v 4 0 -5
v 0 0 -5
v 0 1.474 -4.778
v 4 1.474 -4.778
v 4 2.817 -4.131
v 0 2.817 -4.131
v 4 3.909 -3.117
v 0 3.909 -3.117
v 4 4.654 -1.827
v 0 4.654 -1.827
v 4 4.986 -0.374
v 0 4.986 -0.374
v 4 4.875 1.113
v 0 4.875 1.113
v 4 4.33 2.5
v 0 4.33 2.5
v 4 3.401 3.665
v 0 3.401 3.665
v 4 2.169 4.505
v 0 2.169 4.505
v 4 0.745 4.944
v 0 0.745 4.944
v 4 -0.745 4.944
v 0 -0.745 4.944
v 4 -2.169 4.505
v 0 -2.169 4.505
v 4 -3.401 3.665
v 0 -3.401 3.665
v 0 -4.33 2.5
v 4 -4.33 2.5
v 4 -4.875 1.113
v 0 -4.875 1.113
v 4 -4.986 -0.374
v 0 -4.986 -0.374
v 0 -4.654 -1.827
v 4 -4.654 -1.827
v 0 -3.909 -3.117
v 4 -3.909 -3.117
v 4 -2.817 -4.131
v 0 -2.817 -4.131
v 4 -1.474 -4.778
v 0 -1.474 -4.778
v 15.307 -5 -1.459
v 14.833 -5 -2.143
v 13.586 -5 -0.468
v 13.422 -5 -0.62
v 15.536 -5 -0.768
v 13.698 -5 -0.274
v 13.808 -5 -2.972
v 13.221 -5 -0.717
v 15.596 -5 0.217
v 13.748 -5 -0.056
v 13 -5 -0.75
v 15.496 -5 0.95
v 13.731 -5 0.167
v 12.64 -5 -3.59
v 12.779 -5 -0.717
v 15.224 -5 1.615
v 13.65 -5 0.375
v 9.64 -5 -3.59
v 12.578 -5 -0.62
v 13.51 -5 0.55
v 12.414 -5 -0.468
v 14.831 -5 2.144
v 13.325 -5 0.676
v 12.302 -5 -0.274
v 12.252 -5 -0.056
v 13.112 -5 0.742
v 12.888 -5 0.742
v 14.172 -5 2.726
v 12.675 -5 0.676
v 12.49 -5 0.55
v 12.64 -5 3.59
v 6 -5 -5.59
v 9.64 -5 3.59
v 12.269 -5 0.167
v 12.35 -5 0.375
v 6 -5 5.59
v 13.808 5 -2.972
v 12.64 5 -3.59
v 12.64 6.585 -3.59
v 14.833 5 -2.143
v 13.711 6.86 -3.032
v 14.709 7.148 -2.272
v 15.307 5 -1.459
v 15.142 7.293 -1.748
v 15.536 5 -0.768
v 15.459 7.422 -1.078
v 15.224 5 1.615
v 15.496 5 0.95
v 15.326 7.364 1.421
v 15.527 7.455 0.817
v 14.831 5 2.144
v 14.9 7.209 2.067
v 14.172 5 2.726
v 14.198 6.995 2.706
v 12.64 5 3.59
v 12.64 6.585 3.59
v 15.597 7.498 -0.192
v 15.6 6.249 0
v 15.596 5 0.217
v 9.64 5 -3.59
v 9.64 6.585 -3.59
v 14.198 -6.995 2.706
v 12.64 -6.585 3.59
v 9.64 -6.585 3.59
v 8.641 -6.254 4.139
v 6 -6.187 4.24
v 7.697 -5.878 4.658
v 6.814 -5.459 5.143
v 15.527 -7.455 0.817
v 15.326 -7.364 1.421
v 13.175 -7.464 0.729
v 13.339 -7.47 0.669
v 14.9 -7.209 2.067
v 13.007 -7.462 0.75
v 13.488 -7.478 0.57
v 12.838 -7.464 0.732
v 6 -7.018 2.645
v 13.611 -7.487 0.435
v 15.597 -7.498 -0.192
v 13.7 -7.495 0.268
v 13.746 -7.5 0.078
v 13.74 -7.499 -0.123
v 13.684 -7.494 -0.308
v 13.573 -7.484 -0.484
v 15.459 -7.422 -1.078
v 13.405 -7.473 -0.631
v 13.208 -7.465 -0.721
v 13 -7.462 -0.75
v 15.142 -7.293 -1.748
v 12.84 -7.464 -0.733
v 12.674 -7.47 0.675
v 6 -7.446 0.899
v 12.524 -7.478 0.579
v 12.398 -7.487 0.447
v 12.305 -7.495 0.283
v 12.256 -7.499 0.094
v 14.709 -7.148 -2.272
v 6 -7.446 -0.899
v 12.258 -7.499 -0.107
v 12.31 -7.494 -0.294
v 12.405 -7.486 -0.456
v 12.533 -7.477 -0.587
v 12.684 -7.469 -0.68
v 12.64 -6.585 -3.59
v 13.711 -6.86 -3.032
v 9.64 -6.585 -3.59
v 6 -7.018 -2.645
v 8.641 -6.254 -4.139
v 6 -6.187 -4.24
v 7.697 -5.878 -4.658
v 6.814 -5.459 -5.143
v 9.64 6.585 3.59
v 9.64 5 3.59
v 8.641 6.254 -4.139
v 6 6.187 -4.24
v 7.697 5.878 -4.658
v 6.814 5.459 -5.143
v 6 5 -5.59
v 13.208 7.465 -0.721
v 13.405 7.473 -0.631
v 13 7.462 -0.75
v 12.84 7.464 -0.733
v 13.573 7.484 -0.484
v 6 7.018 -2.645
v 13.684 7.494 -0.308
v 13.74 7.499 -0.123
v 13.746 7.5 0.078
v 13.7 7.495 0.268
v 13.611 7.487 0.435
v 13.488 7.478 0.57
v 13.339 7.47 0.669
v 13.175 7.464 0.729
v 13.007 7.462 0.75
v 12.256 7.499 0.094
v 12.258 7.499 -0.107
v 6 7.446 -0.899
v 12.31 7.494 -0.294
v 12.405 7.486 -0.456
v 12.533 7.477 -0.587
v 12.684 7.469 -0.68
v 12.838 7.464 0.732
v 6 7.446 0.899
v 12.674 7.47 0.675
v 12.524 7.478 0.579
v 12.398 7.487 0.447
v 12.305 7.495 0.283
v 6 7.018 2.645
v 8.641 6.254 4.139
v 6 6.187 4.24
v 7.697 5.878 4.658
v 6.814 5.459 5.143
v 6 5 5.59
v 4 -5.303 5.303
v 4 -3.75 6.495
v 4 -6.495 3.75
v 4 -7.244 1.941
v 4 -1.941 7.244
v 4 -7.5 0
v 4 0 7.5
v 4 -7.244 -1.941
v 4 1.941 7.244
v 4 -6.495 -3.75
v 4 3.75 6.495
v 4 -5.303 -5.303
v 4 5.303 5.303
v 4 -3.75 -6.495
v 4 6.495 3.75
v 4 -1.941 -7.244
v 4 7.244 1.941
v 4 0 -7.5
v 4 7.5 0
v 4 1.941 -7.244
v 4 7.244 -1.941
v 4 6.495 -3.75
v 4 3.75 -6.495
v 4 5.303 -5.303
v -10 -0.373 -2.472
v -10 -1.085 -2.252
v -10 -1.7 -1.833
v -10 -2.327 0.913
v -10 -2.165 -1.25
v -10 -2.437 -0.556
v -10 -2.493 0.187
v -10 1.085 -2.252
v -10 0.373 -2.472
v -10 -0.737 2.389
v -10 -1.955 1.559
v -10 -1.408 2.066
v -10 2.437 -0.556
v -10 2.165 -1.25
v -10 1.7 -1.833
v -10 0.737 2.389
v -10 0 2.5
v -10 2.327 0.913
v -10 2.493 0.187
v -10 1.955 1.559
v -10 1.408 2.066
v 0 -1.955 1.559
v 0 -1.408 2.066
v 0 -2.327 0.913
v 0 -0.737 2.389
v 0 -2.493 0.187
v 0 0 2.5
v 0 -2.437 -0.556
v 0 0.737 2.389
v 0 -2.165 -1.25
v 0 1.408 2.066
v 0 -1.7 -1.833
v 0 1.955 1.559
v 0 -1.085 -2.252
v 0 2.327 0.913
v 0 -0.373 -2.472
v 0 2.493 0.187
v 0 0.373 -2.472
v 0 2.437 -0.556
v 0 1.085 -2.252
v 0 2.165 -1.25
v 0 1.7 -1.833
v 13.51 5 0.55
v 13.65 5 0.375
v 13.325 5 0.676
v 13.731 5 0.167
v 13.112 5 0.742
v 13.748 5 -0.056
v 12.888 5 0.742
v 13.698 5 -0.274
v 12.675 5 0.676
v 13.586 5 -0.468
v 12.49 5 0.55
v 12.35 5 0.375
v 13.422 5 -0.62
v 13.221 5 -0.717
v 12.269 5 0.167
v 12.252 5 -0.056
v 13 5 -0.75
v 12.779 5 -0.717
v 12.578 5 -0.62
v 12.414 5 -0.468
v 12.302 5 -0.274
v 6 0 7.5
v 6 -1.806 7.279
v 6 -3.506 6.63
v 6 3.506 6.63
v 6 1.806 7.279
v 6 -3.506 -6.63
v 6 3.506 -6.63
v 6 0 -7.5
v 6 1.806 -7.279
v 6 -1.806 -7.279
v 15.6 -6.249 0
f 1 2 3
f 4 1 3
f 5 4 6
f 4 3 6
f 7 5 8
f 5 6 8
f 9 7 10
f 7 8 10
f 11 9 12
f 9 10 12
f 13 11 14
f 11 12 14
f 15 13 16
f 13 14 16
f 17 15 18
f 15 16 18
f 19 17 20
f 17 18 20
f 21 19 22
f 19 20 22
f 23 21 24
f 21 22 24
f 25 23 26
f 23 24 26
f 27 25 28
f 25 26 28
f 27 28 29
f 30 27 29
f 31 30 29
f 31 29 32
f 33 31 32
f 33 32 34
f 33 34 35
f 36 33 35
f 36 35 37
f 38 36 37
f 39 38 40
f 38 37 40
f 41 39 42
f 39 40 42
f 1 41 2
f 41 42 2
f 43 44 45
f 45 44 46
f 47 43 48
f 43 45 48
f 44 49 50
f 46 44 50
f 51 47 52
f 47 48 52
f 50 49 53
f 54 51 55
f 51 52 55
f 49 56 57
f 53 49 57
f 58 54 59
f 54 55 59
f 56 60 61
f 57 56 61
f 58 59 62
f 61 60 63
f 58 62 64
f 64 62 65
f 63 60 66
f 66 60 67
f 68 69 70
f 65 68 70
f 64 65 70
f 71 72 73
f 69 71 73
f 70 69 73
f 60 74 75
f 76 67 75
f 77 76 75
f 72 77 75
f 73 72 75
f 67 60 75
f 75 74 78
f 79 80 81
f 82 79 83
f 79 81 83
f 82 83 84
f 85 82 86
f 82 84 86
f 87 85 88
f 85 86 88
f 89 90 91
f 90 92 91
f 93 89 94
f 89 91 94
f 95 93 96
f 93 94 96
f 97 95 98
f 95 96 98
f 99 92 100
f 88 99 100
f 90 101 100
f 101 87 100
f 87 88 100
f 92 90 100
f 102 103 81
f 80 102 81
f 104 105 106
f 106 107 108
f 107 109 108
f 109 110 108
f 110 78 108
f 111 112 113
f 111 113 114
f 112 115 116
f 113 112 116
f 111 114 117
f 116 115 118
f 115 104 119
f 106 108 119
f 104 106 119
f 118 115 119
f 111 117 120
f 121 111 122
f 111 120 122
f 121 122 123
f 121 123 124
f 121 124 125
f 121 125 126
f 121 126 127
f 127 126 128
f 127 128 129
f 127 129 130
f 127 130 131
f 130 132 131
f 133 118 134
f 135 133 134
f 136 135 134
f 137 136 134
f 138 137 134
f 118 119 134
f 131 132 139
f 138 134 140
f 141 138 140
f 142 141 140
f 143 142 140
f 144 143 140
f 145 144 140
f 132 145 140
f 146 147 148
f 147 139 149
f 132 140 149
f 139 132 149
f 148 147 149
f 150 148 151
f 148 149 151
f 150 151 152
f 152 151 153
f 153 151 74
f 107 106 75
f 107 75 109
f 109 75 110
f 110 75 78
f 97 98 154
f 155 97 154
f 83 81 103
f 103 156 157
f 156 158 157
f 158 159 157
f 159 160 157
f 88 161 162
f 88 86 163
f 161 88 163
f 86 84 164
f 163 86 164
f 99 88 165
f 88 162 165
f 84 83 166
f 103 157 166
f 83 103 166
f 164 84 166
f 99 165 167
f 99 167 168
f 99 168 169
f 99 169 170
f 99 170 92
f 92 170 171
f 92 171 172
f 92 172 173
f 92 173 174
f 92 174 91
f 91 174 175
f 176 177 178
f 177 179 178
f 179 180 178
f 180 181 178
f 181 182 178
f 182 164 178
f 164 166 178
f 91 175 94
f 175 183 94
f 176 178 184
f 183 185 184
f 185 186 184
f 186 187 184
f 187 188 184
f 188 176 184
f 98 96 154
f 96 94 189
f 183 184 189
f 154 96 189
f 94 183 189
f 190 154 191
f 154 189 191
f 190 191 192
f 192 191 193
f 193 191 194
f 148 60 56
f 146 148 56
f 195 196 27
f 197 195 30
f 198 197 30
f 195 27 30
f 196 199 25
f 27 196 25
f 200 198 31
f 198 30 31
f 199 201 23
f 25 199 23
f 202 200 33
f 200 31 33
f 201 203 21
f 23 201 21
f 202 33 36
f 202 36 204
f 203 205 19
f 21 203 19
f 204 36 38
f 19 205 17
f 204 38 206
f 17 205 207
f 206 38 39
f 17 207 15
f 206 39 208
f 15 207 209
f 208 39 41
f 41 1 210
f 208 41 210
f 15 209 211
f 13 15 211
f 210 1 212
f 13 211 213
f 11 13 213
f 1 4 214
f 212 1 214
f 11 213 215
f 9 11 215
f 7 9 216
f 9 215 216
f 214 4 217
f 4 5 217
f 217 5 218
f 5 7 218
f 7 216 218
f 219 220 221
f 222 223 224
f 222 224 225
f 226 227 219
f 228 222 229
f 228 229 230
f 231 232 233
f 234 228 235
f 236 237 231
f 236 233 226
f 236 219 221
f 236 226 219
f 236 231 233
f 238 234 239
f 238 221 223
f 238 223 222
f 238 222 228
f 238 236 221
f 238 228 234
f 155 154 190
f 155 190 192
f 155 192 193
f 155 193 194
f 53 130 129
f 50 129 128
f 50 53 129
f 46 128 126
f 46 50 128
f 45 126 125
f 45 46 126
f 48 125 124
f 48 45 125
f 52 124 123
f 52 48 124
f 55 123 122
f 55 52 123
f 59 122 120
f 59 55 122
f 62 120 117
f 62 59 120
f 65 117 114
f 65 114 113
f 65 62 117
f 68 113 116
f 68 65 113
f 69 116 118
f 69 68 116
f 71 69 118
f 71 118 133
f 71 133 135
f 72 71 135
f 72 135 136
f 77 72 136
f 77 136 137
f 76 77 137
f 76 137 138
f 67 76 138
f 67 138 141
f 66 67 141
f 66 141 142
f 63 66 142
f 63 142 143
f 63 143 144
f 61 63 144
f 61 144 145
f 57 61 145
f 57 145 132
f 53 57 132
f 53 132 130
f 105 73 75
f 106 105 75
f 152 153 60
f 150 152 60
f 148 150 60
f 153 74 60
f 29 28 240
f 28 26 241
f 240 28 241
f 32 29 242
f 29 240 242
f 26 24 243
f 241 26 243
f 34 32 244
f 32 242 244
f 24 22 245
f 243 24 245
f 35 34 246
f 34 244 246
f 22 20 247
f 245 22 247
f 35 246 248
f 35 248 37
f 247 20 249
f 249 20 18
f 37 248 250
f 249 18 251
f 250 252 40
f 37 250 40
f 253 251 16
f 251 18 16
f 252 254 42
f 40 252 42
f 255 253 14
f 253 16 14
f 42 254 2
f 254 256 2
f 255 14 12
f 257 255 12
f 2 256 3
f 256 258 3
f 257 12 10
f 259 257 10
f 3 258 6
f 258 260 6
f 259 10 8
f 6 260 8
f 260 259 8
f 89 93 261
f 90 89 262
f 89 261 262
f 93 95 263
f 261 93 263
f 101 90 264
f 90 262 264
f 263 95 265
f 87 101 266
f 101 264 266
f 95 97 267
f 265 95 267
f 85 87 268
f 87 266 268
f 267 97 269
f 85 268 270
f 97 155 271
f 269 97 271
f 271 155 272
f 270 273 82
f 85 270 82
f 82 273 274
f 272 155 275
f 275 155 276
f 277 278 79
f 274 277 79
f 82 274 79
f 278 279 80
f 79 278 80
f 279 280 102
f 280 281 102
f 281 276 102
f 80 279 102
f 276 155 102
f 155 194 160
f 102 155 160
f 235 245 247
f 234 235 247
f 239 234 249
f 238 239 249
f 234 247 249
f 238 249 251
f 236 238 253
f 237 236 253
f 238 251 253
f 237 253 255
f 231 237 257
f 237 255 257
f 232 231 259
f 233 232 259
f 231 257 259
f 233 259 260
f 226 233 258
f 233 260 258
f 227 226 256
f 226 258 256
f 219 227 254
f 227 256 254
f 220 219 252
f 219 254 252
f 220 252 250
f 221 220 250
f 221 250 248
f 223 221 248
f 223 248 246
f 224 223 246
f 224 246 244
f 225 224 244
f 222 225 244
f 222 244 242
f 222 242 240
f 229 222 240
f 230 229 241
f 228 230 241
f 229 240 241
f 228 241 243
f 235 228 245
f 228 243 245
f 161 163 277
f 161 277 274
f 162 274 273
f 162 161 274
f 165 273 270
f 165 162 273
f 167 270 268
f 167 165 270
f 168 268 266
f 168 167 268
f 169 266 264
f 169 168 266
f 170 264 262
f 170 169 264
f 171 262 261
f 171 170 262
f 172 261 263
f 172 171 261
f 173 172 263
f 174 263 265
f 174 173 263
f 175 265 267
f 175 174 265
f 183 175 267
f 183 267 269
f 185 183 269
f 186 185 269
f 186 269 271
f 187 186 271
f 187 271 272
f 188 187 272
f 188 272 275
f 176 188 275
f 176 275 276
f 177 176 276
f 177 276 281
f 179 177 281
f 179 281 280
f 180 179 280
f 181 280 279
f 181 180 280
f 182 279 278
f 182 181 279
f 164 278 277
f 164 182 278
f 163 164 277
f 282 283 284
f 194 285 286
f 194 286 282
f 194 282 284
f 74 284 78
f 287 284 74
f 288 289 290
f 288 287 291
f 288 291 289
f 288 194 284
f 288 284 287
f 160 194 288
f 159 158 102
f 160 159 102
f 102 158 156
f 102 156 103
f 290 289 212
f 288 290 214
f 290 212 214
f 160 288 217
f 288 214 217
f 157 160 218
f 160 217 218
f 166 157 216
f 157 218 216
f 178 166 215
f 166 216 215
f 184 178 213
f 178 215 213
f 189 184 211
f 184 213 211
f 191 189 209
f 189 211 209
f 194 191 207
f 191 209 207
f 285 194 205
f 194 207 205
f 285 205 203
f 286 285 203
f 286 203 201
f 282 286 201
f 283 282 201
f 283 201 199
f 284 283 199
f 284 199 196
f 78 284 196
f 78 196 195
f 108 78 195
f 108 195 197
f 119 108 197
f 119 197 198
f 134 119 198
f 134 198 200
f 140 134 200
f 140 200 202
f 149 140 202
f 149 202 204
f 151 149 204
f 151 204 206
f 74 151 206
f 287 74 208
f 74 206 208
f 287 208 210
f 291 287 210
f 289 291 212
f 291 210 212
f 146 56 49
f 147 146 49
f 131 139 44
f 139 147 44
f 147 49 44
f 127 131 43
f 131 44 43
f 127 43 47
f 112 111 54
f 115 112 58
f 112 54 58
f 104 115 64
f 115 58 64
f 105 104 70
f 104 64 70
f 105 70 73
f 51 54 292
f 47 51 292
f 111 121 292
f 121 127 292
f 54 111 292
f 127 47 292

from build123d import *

# Parameters (mm, degrees)
SKETCH1_R               = 5
BOSS_EXTRUDE1_DEPTH     = 4
SKETCH2_R               = 7.5
BOSS_EXTRUDE2_DEPTH     = 2
BOSS_EXTRUDE3_DEPTH     = 10
CUT_EXTRUDE1_DEPTH      = 22.644860822
CUT_EXTRUDE1_DEPTH_BACK = 22.644860822
CUT_EXTRUDE2_DEPTH      = 22.350878369
CUT_EXTRUDE2_DEPTH_BACK = 22.350878369
SKETCH5_R               = 0.75
SKETCH6_R               = 2.5
BOSS_EXTRUDE4_DEPTH     = 10


with BuildPart() as part:
    # Sketch1 → Boss-Extrude1 (new body)
    with BuildSketch(Plane(origin=(0, 0, 0), x_dir=(0, 0, -1), z_dir=(1, 0, 0))):
        Circle(SKETCH1_R)
    extrude(amount=BOSS_EXTRUDE1_DEPTH)

    # Sketch2 → Boss-Extrude2 (add)
    with BuildSketch(Plane(origin=(4, 0, 0), x_dir=(0, 0, -1), z_dir=(1, 0, 0))):
        Circle(SKETCH2_R)
    extrude(amount=BOSS_EXTRUDE2_DEPTH)

    # Sketch3 → Boss-Extrude3 (add)
    with BuildSketch(Plane(origin=(6, 0, 0), x_dir=(0, 0, -1), z_dir=(1, 0, 0))):
        with BuildLine():
            ThreePointArc((5.590169944, 5), (0, 7.5), (-5.590169944, 5))
            Line((-5.590169944, 5), (-4.898979486, 5))
            Line((-4.898979486, 5), (4.898979486, 5))
            Line((4.898979486, 5), (5.590169944, 5))
        make_face()
        with BuildLine():
            Line((-4.898979486, -5), (-5.590169944, -5))
            ThreePointArc((-5.590169944, -5), (0, -7.5), (5.590169944, -5))
            Line((5.590169944, -5), (4.898979486, -5))
            Line((4.898979486, -5), (-4.898979486, -5))
        make_face()
    extrude(amount=BOSS_EXTRUDE3_DEPTH)

    # Sketch4 → Cut-Extrude1 (cut, two sides: drawn at the far end of the back side and taken through both)
    with BuildSketch(Plane.XZ.offset(-5).offset(-CUT_EXTRUDE1_DEPTH_BACK)):
        with BuildLine():
            Line((6, 5.590169944), (16, 5.590169944))
            Line((16, 5.590169944), (16, -5.590169944))
            Line((16, -5.590169944), (6, -5.590169944))
            Line((6, -5.590169944), (9.640400827, -3.590169944))
            Line((9.640400827, -3.590169944), (12.640400827, -3.590169944))
            add(Edge.make_bspline(
                [(12.640400827, -3.590169944), (15.280133609, -2.393446629), (15.919866391, 0), (15.280133609, 2.393446629), (12.640400827, 3.590169944)],
                knots=[0.178885438, 0.178885438, 0.178885438, 0.178885438, 0.5, 0.821114562, 0.821114562, 0.821114562, 0.821114562], degree=3))
            Line((12.640400827, 3.590169944), (9.640400827, 3.590169944))
            Line((9.640400827, 3.590169944), (6, 5.590169944))
        make_face()
    extrude(amount=CUT_EXTRUDE1_DEPTH + CUT_EXTRUDE1_DEPTH_BACK, mode=Mode.SUBTRACT)

    # Sketch5 → Cut-Extrude2 (cut, two sides: drawn at the far end of the back side and taken through both)
    with BuildSketch(Plane.XZ.offset(-5).offset(-CUT_EXTRUDE2_DEPTH_BACK)):
        with Locations(Location((13, 0, 0), (0, 0, 270))):
            Circle(SKETCH5_R)
    extrude(amount=CUT_EXTRUDE2_DEPTH + CUT_EXTRUDE2_DEPTH_BACK, mode=Mode.SUBTRACT)

    # Sketch6 → Boss-Extrude4 (add)
    with BuildSketch(Plane.ZY):
        Circle(SKETCH6_R)
    extrude(amount=BOSS_EXTRUDE4_DEPTH)


solid = part.part
